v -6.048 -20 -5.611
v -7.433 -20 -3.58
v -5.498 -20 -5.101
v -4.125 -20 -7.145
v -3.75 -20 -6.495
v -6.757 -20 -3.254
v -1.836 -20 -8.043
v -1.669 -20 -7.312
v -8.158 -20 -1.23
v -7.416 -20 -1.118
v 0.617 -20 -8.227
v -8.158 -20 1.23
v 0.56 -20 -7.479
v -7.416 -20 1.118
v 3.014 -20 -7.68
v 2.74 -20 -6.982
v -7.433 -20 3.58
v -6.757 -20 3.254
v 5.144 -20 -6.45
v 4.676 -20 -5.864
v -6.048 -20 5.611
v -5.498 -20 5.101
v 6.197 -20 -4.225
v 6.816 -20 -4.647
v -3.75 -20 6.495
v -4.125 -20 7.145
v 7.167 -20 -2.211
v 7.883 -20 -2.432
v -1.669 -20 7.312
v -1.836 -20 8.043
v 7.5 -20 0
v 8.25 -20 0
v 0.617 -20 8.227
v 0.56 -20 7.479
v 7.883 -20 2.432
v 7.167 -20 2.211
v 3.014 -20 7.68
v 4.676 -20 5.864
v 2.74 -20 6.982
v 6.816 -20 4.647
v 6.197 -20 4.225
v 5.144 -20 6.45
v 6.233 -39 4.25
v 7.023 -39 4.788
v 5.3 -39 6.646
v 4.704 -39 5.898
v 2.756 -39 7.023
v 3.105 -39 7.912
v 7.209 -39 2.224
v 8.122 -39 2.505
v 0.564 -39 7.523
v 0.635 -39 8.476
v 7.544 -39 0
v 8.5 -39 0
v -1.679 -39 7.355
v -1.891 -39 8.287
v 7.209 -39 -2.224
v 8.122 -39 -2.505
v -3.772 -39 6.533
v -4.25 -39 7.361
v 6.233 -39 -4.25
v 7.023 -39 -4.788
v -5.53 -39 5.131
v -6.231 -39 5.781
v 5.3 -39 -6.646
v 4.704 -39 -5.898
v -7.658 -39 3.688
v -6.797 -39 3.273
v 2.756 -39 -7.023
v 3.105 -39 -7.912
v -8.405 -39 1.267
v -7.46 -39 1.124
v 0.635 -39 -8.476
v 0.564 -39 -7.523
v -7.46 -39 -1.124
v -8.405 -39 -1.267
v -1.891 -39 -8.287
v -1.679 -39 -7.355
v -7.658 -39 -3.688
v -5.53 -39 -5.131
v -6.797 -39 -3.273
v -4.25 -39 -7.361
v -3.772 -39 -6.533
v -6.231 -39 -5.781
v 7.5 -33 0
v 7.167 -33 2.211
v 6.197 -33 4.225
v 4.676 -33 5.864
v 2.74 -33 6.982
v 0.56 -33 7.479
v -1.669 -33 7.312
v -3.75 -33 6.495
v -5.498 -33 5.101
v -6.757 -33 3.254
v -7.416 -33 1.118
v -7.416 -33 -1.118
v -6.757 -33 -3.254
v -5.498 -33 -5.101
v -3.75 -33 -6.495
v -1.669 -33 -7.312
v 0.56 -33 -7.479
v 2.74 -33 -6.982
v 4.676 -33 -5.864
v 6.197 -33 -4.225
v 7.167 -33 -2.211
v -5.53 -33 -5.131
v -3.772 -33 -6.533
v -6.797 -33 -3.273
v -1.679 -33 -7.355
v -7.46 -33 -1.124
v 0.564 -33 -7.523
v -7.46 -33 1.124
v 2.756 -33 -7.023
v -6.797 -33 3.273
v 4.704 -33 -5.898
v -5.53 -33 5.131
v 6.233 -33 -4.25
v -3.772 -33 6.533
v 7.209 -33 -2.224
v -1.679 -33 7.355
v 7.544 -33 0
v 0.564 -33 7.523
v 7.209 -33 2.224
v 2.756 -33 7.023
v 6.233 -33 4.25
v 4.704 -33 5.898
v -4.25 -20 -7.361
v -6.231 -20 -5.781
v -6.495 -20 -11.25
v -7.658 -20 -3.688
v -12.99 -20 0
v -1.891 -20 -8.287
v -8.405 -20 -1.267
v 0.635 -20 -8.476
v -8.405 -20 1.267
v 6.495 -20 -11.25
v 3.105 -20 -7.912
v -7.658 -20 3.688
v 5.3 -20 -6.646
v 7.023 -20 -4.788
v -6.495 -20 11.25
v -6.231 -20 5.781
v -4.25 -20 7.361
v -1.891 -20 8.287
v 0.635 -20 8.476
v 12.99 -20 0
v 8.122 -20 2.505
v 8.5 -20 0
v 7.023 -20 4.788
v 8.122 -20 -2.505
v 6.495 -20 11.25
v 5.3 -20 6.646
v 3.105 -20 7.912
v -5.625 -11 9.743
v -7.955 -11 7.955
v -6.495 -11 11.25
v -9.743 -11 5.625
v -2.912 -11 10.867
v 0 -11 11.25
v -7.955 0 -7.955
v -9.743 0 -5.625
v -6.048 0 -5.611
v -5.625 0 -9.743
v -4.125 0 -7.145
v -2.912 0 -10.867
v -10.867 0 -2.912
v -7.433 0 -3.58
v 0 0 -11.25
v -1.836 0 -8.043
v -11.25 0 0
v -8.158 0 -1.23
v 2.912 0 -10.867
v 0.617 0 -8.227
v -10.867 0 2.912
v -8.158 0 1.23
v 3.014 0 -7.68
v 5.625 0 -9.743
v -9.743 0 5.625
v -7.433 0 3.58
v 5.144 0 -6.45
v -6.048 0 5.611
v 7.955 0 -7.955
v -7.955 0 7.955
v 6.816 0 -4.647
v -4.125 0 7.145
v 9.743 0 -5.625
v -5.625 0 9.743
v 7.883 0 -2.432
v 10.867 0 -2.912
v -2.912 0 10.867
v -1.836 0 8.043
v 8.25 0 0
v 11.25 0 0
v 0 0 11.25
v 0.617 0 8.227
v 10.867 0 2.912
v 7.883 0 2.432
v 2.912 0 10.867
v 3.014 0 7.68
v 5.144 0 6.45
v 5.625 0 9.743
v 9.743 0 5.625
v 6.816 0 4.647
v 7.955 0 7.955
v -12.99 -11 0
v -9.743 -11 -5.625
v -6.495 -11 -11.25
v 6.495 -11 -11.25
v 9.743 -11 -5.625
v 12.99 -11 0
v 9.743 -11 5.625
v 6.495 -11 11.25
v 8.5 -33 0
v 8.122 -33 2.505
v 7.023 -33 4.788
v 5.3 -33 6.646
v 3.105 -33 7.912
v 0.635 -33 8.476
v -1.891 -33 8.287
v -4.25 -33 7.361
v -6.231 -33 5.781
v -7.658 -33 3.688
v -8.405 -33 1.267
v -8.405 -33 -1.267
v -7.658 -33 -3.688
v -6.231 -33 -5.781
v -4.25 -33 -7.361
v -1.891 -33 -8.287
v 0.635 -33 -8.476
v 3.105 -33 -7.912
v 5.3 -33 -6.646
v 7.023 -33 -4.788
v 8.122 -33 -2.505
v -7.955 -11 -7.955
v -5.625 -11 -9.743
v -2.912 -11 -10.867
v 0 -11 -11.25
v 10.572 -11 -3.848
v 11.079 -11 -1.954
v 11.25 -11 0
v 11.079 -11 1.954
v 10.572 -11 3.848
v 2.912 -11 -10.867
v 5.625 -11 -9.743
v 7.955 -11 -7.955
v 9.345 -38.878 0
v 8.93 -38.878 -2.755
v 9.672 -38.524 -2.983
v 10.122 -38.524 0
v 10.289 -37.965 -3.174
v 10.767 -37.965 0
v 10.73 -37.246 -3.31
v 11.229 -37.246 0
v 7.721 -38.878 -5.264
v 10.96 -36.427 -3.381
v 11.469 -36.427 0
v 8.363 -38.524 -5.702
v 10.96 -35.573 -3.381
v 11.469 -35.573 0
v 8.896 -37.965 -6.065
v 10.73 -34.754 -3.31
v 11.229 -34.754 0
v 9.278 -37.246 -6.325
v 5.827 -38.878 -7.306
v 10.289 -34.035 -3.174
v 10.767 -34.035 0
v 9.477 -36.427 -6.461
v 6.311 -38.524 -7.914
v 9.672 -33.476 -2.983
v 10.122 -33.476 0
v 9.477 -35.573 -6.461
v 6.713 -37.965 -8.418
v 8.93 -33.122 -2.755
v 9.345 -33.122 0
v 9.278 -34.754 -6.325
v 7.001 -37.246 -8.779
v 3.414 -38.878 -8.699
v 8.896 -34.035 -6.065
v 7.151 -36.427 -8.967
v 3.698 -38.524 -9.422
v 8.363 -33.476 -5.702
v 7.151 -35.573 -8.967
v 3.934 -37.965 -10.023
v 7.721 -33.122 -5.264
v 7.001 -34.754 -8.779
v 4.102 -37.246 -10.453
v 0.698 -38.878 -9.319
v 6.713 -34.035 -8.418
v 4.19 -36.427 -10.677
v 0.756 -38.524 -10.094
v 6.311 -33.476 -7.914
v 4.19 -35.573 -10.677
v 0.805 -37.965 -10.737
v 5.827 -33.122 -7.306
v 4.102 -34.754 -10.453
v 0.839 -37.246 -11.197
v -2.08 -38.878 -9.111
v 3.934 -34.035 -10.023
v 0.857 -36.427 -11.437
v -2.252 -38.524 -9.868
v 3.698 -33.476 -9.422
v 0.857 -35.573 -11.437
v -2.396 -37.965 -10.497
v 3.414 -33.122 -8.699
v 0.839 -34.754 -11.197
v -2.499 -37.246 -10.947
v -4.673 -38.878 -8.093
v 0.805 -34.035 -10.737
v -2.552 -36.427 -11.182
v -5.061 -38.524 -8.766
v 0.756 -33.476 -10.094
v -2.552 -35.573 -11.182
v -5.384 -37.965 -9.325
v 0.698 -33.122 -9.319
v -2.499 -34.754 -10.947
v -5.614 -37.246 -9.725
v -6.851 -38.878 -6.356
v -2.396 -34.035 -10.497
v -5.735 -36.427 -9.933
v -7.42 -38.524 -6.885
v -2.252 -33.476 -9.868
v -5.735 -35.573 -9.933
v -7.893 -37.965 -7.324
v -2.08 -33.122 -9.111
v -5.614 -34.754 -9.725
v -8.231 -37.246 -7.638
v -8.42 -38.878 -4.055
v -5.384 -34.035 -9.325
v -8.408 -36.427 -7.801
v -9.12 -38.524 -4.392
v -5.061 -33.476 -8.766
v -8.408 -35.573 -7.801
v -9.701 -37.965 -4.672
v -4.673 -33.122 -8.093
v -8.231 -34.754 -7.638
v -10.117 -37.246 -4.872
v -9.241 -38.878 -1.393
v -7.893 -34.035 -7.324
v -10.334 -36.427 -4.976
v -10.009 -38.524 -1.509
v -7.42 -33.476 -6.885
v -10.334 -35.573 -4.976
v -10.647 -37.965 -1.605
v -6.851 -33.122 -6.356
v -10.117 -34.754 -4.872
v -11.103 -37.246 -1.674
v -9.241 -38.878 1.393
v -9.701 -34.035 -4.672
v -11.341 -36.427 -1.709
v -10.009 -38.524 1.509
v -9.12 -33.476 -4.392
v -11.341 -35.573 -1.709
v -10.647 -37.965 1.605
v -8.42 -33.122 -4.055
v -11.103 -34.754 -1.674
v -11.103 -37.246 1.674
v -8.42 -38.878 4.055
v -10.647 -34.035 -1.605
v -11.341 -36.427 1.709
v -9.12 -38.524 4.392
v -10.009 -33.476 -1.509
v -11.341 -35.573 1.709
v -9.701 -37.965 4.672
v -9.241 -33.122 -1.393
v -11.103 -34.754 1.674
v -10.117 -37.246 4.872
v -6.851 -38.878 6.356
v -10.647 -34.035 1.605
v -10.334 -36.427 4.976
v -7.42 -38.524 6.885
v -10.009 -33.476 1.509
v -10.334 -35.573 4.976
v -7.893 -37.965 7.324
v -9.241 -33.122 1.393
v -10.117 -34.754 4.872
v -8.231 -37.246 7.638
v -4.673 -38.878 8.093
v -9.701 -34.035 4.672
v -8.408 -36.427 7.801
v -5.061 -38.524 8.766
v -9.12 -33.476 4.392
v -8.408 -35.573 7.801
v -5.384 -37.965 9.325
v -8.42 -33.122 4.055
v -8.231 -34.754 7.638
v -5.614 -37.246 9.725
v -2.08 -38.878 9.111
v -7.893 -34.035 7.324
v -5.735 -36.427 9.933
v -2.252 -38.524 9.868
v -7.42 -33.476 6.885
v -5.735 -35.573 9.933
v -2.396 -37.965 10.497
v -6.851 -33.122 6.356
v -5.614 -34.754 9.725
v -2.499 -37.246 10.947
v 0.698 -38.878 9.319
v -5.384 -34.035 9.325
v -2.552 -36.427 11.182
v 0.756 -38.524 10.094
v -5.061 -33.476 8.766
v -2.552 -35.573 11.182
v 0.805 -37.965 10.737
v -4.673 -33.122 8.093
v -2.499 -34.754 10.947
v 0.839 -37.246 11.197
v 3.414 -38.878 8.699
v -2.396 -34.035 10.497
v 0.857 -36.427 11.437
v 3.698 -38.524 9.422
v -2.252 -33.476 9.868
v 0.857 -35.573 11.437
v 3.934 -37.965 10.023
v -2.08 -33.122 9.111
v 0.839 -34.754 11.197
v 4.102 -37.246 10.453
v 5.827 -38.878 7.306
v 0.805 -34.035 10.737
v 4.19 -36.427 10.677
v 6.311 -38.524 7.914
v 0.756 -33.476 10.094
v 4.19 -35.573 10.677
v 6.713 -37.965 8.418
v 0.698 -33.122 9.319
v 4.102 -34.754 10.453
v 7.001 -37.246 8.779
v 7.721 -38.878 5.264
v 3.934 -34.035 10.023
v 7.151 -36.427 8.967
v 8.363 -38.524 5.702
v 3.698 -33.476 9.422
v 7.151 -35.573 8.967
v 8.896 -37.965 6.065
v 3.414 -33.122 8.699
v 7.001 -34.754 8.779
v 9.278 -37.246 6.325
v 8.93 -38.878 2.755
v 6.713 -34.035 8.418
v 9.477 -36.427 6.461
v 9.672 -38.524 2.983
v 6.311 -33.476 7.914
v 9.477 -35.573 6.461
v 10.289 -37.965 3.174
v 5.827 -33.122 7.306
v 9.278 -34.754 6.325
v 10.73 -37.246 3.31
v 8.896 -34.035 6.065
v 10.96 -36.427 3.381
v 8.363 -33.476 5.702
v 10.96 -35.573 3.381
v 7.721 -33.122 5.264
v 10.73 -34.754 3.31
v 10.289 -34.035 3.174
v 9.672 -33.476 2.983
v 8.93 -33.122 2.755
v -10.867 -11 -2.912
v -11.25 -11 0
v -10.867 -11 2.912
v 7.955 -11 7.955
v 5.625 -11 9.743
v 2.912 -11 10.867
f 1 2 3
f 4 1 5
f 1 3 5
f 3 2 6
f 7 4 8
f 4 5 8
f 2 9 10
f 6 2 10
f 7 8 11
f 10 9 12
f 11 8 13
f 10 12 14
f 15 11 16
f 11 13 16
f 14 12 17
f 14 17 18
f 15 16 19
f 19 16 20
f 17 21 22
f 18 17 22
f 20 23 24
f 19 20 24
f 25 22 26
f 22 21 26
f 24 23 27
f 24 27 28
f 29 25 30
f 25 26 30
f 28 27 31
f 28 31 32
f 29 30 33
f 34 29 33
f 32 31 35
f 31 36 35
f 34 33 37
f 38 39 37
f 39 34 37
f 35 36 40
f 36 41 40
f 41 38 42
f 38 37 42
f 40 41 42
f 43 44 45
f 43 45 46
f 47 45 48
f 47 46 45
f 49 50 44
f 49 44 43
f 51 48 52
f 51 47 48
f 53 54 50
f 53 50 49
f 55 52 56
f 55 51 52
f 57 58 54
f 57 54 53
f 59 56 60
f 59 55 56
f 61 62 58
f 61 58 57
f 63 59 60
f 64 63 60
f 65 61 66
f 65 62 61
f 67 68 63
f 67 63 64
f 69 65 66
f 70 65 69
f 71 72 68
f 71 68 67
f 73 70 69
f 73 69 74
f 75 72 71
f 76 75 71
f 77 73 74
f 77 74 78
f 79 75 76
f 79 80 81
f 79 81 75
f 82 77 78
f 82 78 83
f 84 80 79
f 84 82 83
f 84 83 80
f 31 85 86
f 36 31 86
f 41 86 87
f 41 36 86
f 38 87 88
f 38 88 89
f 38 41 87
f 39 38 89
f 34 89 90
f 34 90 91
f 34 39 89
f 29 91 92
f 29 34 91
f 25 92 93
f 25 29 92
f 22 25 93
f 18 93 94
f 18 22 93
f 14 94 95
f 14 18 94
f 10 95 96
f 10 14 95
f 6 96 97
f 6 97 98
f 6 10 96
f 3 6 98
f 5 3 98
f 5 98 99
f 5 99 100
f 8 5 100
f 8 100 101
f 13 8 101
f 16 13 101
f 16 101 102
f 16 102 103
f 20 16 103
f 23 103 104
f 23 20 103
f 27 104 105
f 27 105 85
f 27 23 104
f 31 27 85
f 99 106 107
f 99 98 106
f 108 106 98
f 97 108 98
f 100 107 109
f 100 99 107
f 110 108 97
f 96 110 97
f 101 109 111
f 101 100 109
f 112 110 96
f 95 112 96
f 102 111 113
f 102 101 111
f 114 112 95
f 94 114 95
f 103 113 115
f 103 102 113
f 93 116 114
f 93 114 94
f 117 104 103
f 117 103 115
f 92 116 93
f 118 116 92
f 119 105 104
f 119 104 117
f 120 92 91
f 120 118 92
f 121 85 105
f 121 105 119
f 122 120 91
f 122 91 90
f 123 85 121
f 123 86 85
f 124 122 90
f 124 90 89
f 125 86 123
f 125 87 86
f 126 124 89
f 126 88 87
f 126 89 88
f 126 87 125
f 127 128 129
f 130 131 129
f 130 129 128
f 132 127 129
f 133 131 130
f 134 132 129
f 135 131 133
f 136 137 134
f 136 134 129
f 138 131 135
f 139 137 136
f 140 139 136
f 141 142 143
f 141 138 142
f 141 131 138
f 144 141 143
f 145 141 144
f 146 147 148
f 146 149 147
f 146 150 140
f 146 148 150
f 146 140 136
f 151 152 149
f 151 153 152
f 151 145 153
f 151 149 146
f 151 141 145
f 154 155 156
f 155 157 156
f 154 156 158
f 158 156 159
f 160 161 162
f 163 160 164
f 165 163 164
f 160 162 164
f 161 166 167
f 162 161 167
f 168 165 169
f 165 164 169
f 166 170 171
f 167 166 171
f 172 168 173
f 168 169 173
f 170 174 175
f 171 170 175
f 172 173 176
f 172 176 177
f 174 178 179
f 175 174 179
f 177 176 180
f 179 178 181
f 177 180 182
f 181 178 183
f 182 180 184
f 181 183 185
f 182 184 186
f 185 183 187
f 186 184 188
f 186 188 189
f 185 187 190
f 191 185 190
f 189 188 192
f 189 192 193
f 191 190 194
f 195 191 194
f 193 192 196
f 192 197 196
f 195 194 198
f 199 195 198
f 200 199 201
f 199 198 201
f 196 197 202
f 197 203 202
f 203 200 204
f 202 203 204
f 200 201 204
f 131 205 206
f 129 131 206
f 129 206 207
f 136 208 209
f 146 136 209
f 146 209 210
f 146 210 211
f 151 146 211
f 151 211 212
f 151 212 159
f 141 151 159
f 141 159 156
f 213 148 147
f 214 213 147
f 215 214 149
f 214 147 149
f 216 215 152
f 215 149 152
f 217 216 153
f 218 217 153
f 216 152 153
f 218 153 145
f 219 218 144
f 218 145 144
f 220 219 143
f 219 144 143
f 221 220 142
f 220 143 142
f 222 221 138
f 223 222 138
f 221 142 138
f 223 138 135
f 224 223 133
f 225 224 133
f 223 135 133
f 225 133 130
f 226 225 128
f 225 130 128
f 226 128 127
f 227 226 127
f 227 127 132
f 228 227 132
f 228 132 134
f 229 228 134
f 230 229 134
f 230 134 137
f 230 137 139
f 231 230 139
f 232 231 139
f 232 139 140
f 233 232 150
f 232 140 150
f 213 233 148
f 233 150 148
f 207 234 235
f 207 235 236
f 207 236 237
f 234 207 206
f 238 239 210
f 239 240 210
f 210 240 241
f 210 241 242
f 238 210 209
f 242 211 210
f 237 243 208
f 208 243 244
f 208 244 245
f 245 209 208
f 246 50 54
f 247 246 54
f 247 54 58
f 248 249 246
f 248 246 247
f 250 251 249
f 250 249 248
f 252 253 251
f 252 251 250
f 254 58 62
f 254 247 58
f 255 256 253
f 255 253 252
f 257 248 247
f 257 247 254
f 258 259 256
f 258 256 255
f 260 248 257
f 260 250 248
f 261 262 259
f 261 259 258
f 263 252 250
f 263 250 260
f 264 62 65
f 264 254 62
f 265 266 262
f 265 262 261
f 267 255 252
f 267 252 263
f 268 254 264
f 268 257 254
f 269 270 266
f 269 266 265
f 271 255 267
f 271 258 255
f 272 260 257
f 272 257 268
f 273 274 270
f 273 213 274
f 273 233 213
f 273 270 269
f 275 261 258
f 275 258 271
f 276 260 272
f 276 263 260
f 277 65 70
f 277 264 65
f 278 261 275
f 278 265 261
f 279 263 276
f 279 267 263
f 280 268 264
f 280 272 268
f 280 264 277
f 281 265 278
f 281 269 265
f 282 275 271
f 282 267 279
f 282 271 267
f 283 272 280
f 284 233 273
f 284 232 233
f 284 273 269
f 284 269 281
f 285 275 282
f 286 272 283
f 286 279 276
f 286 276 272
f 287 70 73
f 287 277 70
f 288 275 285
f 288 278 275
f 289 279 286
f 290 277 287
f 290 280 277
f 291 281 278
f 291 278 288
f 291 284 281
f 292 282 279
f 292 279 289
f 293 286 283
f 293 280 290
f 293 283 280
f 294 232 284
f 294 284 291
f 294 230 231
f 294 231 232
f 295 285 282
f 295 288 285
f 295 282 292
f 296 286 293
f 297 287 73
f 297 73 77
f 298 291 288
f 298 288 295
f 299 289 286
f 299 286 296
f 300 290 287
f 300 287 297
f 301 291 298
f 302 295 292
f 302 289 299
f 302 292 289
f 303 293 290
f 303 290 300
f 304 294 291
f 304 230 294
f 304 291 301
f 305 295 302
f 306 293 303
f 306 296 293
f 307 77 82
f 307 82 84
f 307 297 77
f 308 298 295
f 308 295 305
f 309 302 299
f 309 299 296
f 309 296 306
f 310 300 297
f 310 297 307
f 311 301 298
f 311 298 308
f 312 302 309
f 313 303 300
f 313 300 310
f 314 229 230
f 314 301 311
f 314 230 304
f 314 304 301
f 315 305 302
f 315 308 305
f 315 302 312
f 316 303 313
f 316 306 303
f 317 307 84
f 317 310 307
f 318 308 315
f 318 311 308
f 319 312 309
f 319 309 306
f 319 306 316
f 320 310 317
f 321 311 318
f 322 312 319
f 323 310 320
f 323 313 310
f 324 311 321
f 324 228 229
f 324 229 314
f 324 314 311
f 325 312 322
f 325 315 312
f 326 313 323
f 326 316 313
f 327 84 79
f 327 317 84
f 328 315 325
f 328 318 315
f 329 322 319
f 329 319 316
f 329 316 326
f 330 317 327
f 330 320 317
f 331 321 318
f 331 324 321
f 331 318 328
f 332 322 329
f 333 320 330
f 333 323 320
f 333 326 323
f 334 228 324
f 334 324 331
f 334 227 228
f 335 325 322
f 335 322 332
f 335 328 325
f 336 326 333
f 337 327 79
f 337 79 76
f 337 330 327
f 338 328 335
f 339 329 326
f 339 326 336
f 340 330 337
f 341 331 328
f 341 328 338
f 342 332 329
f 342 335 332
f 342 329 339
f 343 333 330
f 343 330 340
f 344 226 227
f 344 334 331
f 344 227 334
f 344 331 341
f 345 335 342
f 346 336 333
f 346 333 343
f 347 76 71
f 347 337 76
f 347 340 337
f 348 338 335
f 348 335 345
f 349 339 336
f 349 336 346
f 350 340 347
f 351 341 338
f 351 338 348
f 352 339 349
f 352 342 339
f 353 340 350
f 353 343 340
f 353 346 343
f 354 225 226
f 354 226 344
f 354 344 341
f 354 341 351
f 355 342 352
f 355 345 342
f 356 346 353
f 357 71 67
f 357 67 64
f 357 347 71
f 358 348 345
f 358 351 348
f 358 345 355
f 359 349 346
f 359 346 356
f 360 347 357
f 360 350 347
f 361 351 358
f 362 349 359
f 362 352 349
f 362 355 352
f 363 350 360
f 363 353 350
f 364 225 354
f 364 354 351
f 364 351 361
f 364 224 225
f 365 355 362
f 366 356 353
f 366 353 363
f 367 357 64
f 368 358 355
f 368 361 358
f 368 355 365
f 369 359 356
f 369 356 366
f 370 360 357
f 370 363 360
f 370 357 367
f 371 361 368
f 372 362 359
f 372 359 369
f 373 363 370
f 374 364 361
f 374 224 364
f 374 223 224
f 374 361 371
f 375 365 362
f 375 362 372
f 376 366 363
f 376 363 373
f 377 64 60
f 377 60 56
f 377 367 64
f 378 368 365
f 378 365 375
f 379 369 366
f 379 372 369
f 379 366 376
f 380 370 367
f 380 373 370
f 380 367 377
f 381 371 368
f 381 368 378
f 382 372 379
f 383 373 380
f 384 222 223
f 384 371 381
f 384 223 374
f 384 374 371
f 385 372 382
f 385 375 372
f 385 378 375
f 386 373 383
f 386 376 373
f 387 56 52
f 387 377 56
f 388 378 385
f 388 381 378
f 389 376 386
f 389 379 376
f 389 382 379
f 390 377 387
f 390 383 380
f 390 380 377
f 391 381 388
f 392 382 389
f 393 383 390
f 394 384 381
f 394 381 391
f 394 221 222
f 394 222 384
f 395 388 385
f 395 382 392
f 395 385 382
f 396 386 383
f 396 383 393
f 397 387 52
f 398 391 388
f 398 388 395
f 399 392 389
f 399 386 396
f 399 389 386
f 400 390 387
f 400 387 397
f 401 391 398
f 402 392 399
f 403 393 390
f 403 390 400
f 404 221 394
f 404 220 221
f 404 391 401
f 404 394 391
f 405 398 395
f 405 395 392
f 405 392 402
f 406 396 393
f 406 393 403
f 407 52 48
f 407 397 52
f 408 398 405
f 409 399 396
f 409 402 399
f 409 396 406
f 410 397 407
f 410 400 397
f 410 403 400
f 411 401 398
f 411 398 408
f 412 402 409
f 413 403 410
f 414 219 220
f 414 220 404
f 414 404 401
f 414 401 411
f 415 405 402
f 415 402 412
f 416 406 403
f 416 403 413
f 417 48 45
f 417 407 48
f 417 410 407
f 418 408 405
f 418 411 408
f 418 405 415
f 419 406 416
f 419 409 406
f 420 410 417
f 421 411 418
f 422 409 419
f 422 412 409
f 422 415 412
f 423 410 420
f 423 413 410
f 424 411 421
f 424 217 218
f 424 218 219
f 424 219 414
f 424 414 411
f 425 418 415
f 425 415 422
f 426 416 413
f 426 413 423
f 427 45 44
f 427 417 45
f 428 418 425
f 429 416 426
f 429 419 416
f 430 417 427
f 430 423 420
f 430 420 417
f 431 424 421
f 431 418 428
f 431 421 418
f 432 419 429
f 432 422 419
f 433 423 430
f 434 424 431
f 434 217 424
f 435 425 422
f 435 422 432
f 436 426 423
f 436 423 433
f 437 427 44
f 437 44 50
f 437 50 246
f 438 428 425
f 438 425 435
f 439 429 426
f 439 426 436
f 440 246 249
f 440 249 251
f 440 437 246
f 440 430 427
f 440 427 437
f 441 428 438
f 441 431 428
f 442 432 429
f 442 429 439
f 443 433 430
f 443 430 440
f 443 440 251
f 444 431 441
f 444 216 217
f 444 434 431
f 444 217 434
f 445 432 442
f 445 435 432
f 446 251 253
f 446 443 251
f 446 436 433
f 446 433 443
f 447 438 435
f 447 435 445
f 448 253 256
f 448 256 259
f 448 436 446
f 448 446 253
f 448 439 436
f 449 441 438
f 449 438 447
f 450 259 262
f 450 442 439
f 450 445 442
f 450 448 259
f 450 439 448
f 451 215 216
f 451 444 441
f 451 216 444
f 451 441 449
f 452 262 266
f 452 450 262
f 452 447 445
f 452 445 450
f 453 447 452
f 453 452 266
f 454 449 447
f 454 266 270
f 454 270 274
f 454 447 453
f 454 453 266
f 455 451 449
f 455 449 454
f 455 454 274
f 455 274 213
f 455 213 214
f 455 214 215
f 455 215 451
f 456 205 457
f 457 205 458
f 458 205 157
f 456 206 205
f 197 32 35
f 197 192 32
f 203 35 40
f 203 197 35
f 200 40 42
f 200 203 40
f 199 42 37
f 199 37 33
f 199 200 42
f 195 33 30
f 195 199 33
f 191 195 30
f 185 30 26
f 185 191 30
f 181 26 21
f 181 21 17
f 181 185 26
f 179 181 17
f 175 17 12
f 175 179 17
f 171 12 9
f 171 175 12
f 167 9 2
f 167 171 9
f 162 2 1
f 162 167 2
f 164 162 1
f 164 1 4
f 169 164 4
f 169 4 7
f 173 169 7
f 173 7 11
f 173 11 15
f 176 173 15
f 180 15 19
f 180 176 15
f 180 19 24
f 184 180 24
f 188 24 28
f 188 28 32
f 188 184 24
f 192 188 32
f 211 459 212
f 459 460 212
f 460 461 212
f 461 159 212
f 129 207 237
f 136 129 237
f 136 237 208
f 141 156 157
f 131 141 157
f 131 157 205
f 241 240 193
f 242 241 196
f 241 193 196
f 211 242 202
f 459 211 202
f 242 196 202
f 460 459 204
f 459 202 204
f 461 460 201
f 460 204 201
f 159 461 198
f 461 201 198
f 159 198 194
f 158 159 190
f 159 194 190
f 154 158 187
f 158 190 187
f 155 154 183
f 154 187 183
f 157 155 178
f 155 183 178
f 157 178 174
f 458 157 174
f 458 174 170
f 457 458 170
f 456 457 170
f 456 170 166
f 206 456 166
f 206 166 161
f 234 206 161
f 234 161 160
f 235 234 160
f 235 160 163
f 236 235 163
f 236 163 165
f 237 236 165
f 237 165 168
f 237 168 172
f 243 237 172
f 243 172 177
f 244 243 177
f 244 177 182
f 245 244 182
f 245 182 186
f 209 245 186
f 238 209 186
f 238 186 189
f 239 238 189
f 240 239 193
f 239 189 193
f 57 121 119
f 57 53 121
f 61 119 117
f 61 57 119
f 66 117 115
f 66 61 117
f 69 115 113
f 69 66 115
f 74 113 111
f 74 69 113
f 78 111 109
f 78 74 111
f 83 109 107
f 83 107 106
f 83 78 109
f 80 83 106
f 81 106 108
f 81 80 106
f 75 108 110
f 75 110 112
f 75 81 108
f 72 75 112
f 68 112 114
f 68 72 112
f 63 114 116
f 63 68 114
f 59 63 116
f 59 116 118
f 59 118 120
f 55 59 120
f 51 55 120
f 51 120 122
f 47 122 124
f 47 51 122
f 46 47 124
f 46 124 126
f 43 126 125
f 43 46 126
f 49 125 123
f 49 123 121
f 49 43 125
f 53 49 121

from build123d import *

# Parameters (mm, degrees)
F0_R     = 11.25
F0_R_2   = 8.25
F1_DEPTH = 11
F2_R     = 8.25
F3_DEPTH = 9
F4_R     = 8.5
F4_R_2   = 7.5
F5_DEPTH = 13


with BuildPart() as f1:
    # F0 (on Front) → F1 (new body)
    with BuildSketch(Plane.XZ):
        Circle(F0_R)
        Circle(F0_R_2, mode=Mode.SUBTRACT)
    extrude(amount=F1_DEPTH)

    # F2 (on face) → F3 (join)
    with BuildSketch(Plane.XZ.offset(11)):
        Polygon((6.495191, 11.25), (-6.495191, 11.25), (-12.990381, 0), (-6.495191, -11.25), (6.495191, -11.25), (12.990381, 0), align=None)
        Circle(F2_R, mode=Mode.SUBTRACT)
    extrude(amount=F3_DEPTH)

    # F4 (on face) → F5 (join)
    with BuildSketch(Plane.XZ.offset(20)):
        Circle(F4_R)
        Circle(F4_R_2, mode=Mode.SUBTRACT)
    extrude(amount=F5_DEPTH)

    # F6 (on Top) → F7 (revolve)
    with BuildSketch(Plane.XY):
        with BuildLine():
            Line((7.544115, -39), (8.5, -39))
            ThreePointArc((8.5, -39), (11.5, -36), (8.5, -33))
            Line((8.5, -33), (7.544115, -33))
            Line((7.544115, -33), (7.544115, -39))
        make_face()
    revolve(axis=Axis((0, -35.327807, 0), (0, 1, 0)))


solid = f1.part
